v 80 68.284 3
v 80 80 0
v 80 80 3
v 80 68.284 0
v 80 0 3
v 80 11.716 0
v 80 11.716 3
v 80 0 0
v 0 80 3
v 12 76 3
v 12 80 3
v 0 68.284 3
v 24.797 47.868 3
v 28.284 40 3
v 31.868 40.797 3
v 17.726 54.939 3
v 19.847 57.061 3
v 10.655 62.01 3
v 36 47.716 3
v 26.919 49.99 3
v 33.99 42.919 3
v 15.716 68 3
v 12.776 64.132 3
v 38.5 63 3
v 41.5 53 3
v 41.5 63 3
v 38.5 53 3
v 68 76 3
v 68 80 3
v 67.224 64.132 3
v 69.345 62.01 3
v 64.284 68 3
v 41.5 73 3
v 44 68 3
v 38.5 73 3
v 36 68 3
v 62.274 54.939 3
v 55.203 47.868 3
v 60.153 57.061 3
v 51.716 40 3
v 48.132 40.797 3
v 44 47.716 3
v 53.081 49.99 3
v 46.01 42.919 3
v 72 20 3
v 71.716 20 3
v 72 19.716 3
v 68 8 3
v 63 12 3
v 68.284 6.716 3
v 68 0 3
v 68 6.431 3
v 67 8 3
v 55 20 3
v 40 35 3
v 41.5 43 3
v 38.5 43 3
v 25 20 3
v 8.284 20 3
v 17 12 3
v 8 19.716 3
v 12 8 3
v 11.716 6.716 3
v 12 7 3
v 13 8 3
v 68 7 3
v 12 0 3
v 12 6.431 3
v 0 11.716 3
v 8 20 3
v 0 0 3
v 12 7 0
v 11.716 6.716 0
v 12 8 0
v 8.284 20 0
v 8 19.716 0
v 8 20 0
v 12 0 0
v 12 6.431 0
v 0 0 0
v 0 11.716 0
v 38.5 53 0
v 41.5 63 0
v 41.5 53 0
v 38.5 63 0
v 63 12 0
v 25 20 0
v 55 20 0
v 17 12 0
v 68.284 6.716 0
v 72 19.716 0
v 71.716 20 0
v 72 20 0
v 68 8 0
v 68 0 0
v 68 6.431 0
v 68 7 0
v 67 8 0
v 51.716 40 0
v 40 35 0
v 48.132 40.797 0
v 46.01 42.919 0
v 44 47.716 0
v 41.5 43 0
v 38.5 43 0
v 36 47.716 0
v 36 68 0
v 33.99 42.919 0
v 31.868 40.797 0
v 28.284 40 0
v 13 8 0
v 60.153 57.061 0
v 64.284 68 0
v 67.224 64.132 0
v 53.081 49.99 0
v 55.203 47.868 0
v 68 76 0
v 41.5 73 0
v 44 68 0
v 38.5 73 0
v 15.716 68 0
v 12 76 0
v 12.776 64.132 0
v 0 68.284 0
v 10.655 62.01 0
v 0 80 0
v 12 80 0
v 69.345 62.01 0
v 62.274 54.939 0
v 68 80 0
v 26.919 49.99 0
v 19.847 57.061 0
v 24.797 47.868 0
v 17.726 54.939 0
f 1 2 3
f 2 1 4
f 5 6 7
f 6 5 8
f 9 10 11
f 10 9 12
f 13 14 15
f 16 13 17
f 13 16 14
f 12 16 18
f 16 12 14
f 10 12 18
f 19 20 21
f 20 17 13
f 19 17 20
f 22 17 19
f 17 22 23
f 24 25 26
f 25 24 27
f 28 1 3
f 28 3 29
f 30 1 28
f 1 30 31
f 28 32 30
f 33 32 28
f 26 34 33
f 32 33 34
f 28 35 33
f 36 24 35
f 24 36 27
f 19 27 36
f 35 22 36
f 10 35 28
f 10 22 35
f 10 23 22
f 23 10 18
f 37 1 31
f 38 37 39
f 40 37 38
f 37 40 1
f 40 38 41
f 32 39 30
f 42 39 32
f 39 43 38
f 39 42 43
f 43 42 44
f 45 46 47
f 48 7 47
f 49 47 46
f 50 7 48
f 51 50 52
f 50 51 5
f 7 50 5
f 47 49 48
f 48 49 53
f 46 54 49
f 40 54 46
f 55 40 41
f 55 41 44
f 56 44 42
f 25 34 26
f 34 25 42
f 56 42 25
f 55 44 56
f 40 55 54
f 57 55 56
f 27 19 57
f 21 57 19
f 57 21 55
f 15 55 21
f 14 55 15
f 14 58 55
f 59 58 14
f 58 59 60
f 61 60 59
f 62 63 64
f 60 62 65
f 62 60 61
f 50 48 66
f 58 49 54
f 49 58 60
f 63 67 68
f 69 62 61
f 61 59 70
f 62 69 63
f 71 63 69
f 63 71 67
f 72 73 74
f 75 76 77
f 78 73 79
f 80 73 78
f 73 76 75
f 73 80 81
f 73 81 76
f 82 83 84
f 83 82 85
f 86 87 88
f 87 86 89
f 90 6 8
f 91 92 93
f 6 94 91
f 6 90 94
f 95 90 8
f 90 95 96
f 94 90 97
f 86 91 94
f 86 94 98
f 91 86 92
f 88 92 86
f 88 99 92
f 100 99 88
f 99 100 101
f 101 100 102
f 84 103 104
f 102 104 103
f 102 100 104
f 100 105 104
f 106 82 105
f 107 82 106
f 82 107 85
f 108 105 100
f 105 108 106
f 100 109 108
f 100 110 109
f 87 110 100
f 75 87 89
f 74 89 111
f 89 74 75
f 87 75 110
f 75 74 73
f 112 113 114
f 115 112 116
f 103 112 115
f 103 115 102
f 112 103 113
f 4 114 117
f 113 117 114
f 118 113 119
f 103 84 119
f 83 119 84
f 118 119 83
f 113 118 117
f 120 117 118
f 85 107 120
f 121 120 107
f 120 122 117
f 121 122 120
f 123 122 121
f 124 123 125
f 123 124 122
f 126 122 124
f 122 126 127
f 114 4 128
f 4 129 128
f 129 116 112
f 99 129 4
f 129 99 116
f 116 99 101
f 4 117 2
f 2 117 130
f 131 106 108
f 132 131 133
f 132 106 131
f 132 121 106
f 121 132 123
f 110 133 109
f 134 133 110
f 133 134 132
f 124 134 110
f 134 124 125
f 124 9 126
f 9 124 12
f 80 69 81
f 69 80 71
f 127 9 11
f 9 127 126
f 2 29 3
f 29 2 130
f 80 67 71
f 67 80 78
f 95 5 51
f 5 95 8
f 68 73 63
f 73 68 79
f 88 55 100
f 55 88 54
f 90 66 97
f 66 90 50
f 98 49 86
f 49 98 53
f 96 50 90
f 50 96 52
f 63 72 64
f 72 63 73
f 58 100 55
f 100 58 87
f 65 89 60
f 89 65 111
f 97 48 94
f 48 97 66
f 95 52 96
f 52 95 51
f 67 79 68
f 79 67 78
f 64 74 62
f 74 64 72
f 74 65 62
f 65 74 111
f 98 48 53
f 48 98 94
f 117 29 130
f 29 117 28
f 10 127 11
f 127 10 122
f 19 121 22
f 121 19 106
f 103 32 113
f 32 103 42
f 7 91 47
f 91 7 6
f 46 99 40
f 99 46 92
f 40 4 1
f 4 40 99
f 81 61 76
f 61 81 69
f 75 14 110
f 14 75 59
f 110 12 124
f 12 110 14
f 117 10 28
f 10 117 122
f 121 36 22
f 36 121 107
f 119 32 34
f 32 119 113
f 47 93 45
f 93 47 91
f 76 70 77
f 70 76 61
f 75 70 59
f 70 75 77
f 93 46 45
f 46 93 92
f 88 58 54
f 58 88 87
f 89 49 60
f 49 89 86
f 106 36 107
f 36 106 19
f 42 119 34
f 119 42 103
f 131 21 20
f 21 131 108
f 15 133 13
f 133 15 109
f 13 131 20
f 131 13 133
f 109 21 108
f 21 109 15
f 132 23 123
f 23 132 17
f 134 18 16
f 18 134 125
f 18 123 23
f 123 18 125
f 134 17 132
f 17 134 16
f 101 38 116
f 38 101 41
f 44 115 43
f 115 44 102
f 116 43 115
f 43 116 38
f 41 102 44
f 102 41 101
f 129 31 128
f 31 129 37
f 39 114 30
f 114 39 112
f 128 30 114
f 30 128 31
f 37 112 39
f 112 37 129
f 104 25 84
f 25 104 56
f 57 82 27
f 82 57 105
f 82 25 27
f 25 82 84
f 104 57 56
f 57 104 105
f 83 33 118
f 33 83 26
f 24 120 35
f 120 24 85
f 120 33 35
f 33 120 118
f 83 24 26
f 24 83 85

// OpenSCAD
//Universal car stand for 1/10 touring car

plate = 3;
width = 80;
height = 80; 
leg = 10;
hwcube = 80; //the biggest value of heigth and width

length = 300;

mounthole = 10;

difference() {
union() {

difference() {
	cube([width,height,plate]);

	translate([width/2,height/2-leg/2,0])
	rotate([0,0,180+45])
	cube([hwcube*0.5,hwcube*0.5,plate*3], center =false);

	translate([width/2,0,0])
	rotate([0,0,0])
	cube([width*0.7,height*0.2,plate*3], center = true);

	translate([width/2,height,0])
	rotate([0,0,0])
	cube([width*0.7,height*0.2,plate*3], center = true);
	
	translate([width/2,height*0.9,0])
	rotate([0,0,45])
	cube([hwcube*0.5,hwcube*0.5,plate*3], center = true);

	

	//side cuts
	translate([width,height*0.5,0])
	rotate([0,0,45])
	cube([hwcube*0.5,hwcube*0.5,plate*3], center = true);
	translate([0,height*0.5,0])
	rotate([0,0,45])
	cube([hwcube*0.5,hwcube*0.5,plate*3], center = true);

	

}
	translate([width/2,height*0.9,plate/2])
	rotate([0,0,0])
	cube([width*0.8,height*0.1,plate], center = true);

	translate([width/2,height*0.2,plate/2])
	rotate([0,0,0])
	cube([width*0.8,height*0.1,plate], center = true);


	translate([width/2,height*0.7,plate/2])
	rotate([0,0,90])
	cube([width*0.4,height*0.1,plate], center = true);
		
}
//mounting holes

	translate([width/2,height*0.7,0])
	rotate([0,0,45])
	union() {
	//low left
	translate([-15,0,0])
	cube([plate,mounthole,plate*3], center = true);
	//high left
	translate([-15,20,0])
	cube([plate,mounthole,plate*3], center = true);
	}

	translate([width/2,height*0.7,0])
	rotate([0,0,-45])
	union() {
	//low left
	translate([15,0,0])
	cube([plate,mounthole,plate*3], center = true);
	//high left
	translate([15,20,0])
	cube([plate,mounthole,plate*3], center = true);
	}
	translate([width/2,height*0.6,0])
	rotate([0,0,0])
	union() {
	//low left
	translate([0,0,0])
	cube([plate,mounthole,plate*3], center = true);
	//high left
	translate([0,20,0])
	cube([plate,mounthole,plate*3], center = true);
	}
}
